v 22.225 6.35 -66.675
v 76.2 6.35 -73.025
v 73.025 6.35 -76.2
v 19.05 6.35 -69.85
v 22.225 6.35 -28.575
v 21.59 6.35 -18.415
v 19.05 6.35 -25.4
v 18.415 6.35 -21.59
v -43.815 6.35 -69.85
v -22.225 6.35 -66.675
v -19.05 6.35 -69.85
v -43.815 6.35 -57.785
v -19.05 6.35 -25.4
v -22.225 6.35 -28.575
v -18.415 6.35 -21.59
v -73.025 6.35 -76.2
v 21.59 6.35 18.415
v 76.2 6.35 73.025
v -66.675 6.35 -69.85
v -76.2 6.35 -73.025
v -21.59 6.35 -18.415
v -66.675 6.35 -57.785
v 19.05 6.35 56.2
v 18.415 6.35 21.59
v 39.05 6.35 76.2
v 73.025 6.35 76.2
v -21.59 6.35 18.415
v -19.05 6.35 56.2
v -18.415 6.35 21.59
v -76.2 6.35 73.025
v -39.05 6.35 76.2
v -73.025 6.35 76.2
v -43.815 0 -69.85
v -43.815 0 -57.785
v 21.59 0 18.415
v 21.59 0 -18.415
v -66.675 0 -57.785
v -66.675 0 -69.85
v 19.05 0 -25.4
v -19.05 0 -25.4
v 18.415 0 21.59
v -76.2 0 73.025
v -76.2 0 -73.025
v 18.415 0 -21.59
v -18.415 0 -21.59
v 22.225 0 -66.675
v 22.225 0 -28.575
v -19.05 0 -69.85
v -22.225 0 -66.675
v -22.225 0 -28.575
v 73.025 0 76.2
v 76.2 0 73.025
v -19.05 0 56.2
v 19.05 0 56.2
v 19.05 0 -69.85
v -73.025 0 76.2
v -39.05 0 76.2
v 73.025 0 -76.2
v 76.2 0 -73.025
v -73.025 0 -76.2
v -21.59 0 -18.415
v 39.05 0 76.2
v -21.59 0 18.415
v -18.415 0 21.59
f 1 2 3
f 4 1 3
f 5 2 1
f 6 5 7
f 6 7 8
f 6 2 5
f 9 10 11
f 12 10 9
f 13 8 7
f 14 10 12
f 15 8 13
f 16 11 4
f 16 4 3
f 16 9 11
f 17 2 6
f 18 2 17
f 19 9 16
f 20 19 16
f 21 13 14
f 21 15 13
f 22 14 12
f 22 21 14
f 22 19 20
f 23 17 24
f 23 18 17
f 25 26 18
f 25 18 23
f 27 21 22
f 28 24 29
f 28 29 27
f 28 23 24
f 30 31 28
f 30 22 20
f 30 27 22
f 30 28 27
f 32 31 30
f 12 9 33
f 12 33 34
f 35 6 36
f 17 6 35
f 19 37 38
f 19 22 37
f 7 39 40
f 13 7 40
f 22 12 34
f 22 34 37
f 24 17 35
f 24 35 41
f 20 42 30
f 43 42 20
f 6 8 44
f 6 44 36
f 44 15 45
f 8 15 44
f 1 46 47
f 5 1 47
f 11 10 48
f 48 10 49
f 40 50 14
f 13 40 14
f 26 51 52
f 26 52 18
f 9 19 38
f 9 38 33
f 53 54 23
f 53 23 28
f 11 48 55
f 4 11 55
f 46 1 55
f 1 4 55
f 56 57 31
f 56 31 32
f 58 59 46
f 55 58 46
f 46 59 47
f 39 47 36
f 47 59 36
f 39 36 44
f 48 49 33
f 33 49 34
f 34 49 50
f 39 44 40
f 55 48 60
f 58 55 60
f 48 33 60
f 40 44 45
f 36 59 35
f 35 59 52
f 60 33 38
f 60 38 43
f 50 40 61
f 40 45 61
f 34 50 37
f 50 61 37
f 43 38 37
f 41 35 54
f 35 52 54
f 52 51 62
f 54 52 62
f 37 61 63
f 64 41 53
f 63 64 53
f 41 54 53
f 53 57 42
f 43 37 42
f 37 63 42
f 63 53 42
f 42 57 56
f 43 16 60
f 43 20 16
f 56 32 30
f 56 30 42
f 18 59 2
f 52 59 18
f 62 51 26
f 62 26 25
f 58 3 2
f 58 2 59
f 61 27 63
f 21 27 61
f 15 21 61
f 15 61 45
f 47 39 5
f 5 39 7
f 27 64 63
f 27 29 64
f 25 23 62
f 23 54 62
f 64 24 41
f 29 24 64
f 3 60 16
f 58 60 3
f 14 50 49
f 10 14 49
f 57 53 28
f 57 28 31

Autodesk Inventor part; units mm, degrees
ref_plane "YZ Plane" through (0, 0, 0) normal (1, 0, 0) x (0, 1, 0)
ref_plane "XZ Plane" through (0, 0, 0) normal (0, 1, 0) x (-1, 0, 0)
ref_plane "XY Plane" through (0, 0, 0) normal (0, 0, 1) x (1, 0, 0)
sketch "Sketch1" plane through (0, 0, 0) normal (0, 1, 0) x (-1, 0, 0)
  line L0 (76.2, -76.2) -> (-76.2, -76.2)
  line L1 (-76.2, -76.2) -> (-76.2, 76.2)
  line L2 (76.2, 76.2) -> (76.2, -76.2)
  line L3 (-22.225, -25.4) -> (22.225, -25.4)
  line L4 (22.225, -25.4) -> (22.225, -69.85)
  line L5 (22.225, -69.85) -> (-22.225, -69.85)
  line L6 (-22.225, -69.85) -> (-22.225, -25.4)
  line L7 (-19.05, 56.2) -> (19.05, 56.2)
  line L8 (-76.2, 76.2) -> (-39.05, 76.2)
  line L9 (39.05, 76.2) -> (76.2, 76.2)
  line L10 (19.05, 56.2) -> (39.05, 76.2)
  line L11 (-19.05, 56.2) -> (-39.05, 76.2)
  point P0 (0, 0)
  dimension "d0" = 152.4
  dimension "d2" = 152.4
  dimension "d3" = 76.2
  dimension "d4" = 76.2
  dimension "d5" = 44.45
  dimension "d6" = 44.45
  dimension "d7" = 22.225
  dimension "d26" = 56.2
  dimension "d31" = 45
  dimension "d32" = 45
  dimension "d33" = 38.1
  dimension "d34" = 57.15
  dimension "d56" = 6.35
extrude "Extrusion1" add sketch "Sketch1" along normal blind 6.35
chamfer "Chamfer2" distance 3.175 angle 45 1 edges at (76.2, 3.175, 76.2)
chamfer "Chamfer3" distance 3.175 angle 45 3 edges at (76.2, 3.175, -76.2) (-76.2, 3.175, -76.2) (-76.2, 3.175, 76.2)
sketch "Sketch3" plane through (0, 6.35, 0) normal (0, 1, 0) x (1, 0, 0)
  line L0 (-18.415, 21.59) -> (18.415, 21.59)
  line L1 (21.59, 18.415) -> (21.59, -18.415)
  line L2 (18.415, -21.59) -> (-18.415, -21.59)
  line L3 (-21.59, -18.415) -> (-21.59, 18.415)
  line L4 (-21.59, 18.415) -> (-18.415, 21.59)
  line L5 (18.415, 21.59) -> (21.59, 18.415)
  line L6 (21.59, -18.415) -> (18.415, -21.59)
  line L7 (-18.415, -21.59) -> (-21.59, -18.415)
  point P0 (0, 0)
  point P1 (-21.59, 21.59)
  point P2 (21.59, -21.59)
  point P3 (21.59, 21.59)
  point P4 (-21.59, -21.59)
  dimension "d41" = 43.18
  dimension "d43" = 43.18
  dimension "d44" = 21.59
  dimension "d45" = 21.59
  dimension "d46" = 3.175
  dimension "d47" = 3.175
  dimension "d48" = 3.175
  dimension "d49" = 3.175
  dimension "d50" = 3.175
  dimension "d51" = 3.175
  dimension "d52" = 3.175
  dimension "d53" = 3.175
extrude "Extrusion2" cut sketch "Sketch3" against normal through all
chamfer "Chamfer4" distance 3.175 angle 45 4 edges at (-22.225, 3.175, -69.85) (-22.225, 3.175, -25.4) (22.225, 3.175, -69.85) (22.225, 3.175, -25.4)
sketch "Sketch4" plane through (0, 6.35, 0) normal (0, 1, 0) x (1, 0, 0)
  line L0 (73.025, 76.2) -> (-73.025, 76.2) projected
  line L1 (-76.2, 73.025) -> (-76.2, -73.025) projected
  line L2 (-66.675, 69.85) -> (-43.815, 69.85)
  line L3 (-43.815, 69.85) -> (-43.815, 57.785)
  line L4 (-43.815, 57.785) -> (-66.675, 57.785)
  line L5 (-66.675, 57.785) -> (-66.675, 69.85)
  point P0 (0, 0)
  dimension "d60" = 12.065
  dimension "d62" = 22.86
  dimension "d65" = 9.525
  dimension "d66" = 6.35
extrude "Extrusion3" cut sketch "Sketch4" against normal through all
equation "\"d3\" = 0.5 * d0"
equation "\"d4\" = 0.5 * d2"
equation "\"d7\" = 0.5 * d5"
equation "\"d34\" = -0.5 * d33 + 0.5 * d0"
equation "\"d44\" = 0.5 * d43"
equation "\"d45\" = 0.5 * d41"
equation "\"d47\" = d46"
equation "\"d48\" = d46"
equation "\"d49\" = d48"
equation "\"d50\" = d46"
equation "\"d51\" = d50"
equation "\"d52\" = d46"
equation "\"d53\" = d52"
properties part number "carousel_base"
